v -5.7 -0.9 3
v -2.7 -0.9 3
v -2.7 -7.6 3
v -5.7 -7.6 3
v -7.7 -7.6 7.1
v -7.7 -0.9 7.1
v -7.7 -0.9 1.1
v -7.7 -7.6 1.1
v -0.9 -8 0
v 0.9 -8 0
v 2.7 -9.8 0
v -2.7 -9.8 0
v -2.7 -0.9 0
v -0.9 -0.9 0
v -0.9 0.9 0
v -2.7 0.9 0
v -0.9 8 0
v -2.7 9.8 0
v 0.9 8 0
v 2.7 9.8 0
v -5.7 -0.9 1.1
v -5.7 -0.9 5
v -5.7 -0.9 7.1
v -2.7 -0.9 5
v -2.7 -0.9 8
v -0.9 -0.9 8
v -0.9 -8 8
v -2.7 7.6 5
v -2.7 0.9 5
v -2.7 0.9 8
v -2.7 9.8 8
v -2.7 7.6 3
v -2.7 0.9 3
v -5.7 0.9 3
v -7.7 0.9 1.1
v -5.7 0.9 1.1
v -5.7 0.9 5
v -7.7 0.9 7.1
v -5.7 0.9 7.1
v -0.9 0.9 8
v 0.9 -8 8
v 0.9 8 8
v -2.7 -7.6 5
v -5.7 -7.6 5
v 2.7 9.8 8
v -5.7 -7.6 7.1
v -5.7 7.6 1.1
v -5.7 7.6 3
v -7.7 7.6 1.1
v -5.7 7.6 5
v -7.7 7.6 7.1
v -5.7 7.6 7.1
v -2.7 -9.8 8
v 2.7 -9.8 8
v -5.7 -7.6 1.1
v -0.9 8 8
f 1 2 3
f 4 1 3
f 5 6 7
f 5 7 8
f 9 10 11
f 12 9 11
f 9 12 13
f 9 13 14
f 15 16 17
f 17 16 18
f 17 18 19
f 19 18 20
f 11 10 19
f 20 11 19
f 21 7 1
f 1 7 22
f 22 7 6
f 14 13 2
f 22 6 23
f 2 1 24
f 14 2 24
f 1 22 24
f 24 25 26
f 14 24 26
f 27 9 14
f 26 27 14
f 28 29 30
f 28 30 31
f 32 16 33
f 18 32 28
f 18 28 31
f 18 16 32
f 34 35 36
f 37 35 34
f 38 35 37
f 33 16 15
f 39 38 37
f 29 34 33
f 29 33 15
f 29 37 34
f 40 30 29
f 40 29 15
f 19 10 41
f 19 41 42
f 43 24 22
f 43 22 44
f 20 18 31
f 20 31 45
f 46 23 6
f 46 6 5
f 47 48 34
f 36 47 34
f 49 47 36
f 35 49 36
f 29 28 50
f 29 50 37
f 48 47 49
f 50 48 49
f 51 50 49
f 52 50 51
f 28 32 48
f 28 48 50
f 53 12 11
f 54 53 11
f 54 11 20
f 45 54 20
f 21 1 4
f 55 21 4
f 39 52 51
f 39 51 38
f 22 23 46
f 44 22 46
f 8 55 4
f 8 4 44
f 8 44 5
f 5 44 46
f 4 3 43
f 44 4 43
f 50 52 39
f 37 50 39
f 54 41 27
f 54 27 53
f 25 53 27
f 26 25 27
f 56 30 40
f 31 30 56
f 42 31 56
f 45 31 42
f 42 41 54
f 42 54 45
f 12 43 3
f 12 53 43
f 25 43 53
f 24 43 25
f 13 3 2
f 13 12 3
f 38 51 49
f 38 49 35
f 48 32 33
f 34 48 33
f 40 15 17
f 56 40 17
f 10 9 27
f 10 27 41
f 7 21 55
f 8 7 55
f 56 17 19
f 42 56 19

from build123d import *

# Parameters (mm, degrees)
F0_W     = 5.4
F0_H     = 19.6
F0_W_2   = 1.8
F0_H_2   = 16
F1_DEPTH = 8
F2_W     = 15.2
F2_H     = 2
F3_DEPTH = 3
F4_W     = 15.2
F4_H     = 6
F5_DEPTH = 2
F6_W     = 9.064092
F6_H     = 1.8
F7_DEPTH = 8.001


with BuildPart() as f1:
    # F0 (on Top) → F1 (new body)
    with BuildSketch(Plane.XY):
        Rectangle(F0_W, F0_H)
        Rectangle(F0_W_2, F0_H_2, mode=Mode.SUBTRACT)
    extrude(amount=F1_DEPTH)

    # F2 (on face) → F3 (join)
    with BuildSketch(Plane(origin=(-2.7, 0, 0), x_dir=(0, -1, 0), z_dir=(-1, 0, 0))):
        with Locations((0, 4)):
            Rectangle(F2_W, F2_H)
    extrude(amount=F3_DEPTH)

    # F4 (on face) → F5 (join)
    with BuildSketch(Plane(origin=(-5.7, 0, 0), x_dir=(0, -1, 0), z_dir=(-1, 0, 0))):
        with Locations((0, 4.1)):
            Rectangle(F4_W, F4_H)
    extrude(amount=F5_DEPTH)

    # F6 (on face) → F7 (cut, through all)
    with BuildSketch(Plane.XY.offset(8)):
        with Locations((-5.432046, 0)):
            Rectangle(F6_W, F6_H)
    extrude(amount=-F7_DEPTH, mode=Mode.SUBTRACT)


solid = f1.part
